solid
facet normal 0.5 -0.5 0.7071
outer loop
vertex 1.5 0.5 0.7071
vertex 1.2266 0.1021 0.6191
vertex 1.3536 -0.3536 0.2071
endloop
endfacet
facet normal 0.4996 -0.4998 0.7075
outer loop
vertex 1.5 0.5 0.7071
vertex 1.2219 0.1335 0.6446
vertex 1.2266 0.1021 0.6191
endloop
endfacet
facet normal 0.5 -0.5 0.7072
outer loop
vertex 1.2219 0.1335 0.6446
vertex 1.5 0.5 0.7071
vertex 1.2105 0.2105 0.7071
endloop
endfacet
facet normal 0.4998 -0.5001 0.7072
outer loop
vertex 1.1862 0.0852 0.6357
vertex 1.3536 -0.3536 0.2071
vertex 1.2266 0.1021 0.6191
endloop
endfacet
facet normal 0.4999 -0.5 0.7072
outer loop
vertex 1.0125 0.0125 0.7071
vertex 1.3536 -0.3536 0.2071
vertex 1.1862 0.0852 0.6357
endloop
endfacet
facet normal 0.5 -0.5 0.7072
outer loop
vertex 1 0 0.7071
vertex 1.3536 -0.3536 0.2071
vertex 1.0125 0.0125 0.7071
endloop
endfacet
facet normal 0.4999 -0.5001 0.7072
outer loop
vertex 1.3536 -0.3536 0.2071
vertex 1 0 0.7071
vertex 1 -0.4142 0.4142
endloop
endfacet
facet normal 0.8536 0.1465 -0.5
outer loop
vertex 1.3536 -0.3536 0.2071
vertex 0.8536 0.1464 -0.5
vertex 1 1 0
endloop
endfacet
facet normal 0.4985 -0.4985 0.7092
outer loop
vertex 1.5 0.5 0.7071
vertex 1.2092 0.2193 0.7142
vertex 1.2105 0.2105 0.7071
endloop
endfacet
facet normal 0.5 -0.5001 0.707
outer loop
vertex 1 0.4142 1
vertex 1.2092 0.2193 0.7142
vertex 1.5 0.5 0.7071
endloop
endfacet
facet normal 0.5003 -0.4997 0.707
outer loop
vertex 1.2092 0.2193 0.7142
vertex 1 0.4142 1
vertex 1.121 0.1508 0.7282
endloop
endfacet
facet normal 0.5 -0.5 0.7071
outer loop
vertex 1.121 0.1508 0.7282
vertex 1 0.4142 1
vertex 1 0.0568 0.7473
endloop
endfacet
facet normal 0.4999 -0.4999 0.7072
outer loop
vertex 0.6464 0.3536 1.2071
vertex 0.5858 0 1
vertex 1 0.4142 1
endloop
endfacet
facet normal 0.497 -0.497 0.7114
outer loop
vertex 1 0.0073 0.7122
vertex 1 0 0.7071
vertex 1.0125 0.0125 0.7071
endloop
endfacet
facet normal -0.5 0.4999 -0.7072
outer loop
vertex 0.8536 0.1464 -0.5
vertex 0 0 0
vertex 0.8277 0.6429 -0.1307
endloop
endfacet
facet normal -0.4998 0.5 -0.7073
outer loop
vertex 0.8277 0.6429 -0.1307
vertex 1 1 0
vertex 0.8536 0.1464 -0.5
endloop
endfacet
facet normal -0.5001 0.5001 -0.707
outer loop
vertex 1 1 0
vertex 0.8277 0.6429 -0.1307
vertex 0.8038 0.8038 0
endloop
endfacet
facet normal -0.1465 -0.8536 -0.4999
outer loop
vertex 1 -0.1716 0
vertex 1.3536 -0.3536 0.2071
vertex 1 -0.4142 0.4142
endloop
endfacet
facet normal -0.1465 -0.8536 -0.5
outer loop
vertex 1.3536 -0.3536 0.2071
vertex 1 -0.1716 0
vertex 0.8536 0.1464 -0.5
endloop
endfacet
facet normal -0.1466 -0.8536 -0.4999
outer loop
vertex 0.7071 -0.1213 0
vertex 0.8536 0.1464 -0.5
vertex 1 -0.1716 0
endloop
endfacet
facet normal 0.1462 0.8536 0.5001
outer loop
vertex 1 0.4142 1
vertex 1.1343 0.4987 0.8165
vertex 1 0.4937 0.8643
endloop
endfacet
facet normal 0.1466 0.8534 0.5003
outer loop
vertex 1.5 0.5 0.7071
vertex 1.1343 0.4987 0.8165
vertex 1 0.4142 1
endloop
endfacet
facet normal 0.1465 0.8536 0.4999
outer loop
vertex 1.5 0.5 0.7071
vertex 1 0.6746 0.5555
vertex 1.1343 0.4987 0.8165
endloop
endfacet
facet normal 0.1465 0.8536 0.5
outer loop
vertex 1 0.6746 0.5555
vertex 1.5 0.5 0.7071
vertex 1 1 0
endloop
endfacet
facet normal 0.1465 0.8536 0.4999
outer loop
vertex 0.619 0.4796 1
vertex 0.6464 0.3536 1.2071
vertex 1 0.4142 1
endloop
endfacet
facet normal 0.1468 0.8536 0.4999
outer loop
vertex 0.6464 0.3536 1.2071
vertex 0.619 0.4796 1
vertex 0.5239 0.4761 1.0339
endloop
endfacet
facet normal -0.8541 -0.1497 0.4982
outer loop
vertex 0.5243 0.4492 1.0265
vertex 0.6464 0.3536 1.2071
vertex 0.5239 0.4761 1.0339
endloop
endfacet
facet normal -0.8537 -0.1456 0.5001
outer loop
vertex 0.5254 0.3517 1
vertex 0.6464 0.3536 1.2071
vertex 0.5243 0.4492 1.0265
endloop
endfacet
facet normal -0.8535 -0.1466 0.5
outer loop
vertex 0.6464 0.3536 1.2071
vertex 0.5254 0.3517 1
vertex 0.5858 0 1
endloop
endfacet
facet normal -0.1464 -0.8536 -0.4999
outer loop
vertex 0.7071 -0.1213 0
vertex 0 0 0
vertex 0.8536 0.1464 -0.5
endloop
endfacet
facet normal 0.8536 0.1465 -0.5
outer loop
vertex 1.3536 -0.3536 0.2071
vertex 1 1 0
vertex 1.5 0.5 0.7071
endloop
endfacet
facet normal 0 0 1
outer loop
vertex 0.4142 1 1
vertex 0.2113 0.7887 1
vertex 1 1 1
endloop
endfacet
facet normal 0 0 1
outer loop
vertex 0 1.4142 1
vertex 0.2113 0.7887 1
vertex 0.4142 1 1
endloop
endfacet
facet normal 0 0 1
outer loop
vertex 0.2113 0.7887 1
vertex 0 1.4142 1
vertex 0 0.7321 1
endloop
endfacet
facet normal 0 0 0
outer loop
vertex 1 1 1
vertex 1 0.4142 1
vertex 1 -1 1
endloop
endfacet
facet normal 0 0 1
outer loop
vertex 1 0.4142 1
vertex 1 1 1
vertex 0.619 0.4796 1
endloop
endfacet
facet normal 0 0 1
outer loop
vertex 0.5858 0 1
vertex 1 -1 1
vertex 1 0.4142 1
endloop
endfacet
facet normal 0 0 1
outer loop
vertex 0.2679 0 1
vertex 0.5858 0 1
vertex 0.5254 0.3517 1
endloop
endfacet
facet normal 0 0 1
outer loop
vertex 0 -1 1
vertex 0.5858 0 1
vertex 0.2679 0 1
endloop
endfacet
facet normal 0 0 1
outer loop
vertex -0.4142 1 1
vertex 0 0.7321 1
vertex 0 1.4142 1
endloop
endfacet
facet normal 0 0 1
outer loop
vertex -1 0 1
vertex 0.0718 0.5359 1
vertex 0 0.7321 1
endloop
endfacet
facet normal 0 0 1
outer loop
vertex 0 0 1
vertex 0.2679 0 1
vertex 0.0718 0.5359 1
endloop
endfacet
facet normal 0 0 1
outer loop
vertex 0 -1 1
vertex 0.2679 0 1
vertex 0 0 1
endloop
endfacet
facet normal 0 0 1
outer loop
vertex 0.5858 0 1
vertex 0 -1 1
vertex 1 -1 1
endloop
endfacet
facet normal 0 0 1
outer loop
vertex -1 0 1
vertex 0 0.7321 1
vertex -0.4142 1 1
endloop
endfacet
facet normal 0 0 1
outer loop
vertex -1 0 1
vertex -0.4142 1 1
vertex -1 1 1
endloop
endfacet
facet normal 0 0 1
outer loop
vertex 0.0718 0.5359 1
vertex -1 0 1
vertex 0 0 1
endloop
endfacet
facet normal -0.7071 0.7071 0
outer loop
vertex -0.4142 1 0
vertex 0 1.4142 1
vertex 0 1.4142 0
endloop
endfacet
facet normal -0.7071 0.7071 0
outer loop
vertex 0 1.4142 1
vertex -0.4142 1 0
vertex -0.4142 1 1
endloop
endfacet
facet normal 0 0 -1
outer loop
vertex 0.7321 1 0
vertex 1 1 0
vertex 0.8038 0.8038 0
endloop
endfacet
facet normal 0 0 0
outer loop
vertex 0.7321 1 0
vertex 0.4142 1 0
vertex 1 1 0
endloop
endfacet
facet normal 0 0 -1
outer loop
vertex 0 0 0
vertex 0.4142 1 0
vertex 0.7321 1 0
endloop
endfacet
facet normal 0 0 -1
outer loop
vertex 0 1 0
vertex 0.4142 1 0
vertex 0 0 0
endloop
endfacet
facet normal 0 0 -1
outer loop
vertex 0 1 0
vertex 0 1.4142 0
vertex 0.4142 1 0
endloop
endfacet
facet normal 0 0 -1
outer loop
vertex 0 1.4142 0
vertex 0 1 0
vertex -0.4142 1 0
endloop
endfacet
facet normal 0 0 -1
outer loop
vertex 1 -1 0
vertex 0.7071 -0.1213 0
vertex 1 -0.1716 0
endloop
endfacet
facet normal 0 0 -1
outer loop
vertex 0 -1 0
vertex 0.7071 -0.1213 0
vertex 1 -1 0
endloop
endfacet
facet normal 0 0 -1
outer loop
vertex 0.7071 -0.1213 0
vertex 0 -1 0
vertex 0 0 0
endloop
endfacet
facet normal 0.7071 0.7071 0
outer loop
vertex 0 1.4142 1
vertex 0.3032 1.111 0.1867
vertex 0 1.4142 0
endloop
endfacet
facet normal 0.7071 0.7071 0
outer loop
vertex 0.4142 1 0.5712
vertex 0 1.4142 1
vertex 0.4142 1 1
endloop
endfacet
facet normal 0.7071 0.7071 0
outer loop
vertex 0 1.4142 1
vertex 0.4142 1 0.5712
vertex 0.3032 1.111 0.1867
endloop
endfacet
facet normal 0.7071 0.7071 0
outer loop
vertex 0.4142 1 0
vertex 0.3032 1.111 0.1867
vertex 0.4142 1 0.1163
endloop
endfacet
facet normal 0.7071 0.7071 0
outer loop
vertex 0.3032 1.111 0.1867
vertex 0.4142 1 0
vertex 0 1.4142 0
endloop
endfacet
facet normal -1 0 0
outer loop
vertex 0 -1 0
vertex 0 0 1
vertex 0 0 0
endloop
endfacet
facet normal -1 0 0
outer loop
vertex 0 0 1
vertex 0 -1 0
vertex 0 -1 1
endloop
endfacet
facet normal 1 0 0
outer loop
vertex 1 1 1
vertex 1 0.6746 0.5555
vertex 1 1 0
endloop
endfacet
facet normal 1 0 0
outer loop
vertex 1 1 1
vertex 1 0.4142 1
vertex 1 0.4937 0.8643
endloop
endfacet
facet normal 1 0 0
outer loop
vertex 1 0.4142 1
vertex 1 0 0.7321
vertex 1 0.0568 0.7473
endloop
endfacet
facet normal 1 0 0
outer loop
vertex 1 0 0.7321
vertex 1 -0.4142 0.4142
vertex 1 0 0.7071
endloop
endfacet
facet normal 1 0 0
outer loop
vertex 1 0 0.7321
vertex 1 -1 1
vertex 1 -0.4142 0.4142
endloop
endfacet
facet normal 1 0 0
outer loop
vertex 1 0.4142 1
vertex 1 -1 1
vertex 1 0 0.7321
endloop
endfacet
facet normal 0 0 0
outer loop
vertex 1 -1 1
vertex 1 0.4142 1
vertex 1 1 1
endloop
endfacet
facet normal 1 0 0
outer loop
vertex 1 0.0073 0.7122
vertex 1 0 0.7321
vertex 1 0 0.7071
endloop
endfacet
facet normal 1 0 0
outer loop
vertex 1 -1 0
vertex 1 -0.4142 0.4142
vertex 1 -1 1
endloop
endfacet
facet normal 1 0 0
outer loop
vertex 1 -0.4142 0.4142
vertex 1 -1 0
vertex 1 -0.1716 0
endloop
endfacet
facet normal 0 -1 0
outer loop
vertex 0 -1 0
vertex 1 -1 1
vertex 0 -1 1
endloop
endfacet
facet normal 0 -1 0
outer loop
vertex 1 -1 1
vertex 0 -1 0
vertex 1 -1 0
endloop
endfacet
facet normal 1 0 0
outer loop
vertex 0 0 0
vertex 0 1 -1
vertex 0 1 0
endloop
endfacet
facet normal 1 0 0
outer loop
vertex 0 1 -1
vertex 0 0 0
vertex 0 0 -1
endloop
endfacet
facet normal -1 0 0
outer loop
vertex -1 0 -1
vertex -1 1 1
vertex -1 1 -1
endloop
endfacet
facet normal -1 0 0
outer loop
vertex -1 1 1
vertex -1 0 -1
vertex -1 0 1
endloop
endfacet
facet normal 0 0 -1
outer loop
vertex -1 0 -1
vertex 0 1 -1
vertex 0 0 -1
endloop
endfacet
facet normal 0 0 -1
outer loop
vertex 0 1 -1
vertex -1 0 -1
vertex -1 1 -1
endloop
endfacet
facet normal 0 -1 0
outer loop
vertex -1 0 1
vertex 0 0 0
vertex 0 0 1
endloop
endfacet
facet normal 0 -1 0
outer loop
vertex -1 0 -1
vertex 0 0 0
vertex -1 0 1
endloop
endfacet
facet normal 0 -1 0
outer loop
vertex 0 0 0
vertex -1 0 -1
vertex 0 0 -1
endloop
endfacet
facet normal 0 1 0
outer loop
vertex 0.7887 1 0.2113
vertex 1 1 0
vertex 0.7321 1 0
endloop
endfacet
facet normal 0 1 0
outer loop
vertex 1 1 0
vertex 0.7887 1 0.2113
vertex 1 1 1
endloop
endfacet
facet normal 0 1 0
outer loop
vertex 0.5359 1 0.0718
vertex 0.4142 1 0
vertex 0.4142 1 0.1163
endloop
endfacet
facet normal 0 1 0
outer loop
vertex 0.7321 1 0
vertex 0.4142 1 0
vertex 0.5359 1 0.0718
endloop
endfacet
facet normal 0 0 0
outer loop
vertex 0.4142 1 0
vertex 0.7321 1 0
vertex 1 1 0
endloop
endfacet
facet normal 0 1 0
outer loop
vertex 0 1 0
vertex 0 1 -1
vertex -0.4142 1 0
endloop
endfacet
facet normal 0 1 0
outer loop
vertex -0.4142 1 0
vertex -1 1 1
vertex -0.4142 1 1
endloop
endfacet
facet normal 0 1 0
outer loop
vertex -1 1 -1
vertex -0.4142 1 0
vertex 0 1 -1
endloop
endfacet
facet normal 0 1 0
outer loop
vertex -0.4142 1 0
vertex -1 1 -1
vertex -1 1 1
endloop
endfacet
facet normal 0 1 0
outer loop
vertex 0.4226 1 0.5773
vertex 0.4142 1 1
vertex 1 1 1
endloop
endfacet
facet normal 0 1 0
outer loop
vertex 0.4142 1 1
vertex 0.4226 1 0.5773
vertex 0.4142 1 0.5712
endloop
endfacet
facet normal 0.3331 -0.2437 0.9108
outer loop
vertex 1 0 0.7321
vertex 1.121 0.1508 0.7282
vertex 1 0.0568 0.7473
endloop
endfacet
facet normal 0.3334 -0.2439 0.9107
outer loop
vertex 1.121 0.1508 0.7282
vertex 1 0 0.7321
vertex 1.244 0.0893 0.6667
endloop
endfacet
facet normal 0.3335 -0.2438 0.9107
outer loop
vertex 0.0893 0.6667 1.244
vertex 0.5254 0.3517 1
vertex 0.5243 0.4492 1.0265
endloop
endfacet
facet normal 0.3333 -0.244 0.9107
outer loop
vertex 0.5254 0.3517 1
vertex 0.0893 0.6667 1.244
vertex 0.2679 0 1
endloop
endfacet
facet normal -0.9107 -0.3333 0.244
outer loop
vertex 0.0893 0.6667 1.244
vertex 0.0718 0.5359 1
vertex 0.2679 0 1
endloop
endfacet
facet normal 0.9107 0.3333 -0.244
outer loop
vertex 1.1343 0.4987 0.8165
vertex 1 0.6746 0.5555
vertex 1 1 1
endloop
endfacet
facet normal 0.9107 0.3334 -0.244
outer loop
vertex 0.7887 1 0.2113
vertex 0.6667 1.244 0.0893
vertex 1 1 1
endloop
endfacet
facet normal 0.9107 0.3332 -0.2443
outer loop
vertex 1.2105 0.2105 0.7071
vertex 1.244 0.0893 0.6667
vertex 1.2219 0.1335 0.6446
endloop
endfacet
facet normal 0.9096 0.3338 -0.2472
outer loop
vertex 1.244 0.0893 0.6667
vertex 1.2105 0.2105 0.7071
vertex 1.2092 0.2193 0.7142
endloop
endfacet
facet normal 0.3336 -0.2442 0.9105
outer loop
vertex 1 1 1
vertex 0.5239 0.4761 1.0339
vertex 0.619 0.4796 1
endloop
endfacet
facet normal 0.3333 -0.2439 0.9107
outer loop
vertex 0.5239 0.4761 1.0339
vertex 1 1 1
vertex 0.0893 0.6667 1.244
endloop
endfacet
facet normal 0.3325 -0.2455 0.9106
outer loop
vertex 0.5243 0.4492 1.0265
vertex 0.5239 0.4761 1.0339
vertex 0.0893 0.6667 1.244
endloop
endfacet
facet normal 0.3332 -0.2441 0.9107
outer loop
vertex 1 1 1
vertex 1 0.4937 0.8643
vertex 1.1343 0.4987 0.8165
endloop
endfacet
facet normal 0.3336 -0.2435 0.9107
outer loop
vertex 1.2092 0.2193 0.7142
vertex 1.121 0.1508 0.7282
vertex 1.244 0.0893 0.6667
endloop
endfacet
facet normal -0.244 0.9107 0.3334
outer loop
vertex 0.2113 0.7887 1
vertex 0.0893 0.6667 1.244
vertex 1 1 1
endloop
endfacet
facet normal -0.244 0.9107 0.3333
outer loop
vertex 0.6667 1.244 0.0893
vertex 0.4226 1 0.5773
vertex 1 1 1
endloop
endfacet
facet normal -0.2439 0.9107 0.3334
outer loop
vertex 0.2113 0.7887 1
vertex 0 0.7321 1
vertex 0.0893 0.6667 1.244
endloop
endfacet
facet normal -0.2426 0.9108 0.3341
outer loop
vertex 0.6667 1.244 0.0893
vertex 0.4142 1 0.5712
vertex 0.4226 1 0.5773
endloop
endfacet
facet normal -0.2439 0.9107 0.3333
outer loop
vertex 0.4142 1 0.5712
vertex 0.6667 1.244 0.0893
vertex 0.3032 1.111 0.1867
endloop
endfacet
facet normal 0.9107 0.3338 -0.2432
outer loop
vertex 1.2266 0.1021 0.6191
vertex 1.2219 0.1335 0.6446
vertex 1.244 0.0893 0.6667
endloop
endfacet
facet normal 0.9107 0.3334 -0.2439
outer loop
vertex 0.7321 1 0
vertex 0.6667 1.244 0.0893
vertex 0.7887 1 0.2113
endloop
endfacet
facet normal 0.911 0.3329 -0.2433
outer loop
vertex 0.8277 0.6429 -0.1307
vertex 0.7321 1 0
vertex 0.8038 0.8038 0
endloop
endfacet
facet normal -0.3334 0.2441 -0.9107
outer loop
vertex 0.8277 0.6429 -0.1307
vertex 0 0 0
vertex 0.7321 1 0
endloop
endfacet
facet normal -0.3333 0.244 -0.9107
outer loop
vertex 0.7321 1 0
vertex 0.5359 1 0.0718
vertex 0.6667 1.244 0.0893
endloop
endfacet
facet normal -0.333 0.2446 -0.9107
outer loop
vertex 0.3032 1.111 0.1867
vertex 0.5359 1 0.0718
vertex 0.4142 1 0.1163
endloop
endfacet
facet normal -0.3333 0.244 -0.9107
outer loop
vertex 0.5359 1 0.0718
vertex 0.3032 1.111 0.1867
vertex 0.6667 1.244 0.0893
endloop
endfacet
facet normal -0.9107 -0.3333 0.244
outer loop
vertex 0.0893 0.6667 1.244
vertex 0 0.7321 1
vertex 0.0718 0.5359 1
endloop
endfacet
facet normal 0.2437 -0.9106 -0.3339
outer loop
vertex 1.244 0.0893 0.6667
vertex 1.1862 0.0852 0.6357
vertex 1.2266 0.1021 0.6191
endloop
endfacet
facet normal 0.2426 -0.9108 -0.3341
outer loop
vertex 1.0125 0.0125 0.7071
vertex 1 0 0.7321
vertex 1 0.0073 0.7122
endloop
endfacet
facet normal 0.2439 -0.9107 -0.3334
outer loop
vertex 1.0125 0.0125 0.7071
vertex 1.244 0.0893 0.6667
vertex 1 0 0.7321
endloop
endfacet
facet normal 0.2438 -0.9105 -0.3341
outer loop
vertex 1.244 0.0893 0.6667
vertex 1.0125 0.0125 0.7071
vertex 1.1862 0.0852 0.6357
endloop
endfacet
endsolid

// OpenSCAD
rotate(a = 45, v = [1, 1, 0]) cube();
rotate(45, [0, 0, 1]) cube();
rotate(a = 90, v = [1, 0, 0]) cube();
rotate(a = 180, v = [0, 1, 0]) cube();
rotate(a = 30, v = [1, 1, 1]) cube();
rotate(a = 90, v = [0, 0, 2]) cube();
rotate(a = 90, v = [0, 0, -1]) cube();
rotate(a = 90, v = [0, 0, 0]) cube();
